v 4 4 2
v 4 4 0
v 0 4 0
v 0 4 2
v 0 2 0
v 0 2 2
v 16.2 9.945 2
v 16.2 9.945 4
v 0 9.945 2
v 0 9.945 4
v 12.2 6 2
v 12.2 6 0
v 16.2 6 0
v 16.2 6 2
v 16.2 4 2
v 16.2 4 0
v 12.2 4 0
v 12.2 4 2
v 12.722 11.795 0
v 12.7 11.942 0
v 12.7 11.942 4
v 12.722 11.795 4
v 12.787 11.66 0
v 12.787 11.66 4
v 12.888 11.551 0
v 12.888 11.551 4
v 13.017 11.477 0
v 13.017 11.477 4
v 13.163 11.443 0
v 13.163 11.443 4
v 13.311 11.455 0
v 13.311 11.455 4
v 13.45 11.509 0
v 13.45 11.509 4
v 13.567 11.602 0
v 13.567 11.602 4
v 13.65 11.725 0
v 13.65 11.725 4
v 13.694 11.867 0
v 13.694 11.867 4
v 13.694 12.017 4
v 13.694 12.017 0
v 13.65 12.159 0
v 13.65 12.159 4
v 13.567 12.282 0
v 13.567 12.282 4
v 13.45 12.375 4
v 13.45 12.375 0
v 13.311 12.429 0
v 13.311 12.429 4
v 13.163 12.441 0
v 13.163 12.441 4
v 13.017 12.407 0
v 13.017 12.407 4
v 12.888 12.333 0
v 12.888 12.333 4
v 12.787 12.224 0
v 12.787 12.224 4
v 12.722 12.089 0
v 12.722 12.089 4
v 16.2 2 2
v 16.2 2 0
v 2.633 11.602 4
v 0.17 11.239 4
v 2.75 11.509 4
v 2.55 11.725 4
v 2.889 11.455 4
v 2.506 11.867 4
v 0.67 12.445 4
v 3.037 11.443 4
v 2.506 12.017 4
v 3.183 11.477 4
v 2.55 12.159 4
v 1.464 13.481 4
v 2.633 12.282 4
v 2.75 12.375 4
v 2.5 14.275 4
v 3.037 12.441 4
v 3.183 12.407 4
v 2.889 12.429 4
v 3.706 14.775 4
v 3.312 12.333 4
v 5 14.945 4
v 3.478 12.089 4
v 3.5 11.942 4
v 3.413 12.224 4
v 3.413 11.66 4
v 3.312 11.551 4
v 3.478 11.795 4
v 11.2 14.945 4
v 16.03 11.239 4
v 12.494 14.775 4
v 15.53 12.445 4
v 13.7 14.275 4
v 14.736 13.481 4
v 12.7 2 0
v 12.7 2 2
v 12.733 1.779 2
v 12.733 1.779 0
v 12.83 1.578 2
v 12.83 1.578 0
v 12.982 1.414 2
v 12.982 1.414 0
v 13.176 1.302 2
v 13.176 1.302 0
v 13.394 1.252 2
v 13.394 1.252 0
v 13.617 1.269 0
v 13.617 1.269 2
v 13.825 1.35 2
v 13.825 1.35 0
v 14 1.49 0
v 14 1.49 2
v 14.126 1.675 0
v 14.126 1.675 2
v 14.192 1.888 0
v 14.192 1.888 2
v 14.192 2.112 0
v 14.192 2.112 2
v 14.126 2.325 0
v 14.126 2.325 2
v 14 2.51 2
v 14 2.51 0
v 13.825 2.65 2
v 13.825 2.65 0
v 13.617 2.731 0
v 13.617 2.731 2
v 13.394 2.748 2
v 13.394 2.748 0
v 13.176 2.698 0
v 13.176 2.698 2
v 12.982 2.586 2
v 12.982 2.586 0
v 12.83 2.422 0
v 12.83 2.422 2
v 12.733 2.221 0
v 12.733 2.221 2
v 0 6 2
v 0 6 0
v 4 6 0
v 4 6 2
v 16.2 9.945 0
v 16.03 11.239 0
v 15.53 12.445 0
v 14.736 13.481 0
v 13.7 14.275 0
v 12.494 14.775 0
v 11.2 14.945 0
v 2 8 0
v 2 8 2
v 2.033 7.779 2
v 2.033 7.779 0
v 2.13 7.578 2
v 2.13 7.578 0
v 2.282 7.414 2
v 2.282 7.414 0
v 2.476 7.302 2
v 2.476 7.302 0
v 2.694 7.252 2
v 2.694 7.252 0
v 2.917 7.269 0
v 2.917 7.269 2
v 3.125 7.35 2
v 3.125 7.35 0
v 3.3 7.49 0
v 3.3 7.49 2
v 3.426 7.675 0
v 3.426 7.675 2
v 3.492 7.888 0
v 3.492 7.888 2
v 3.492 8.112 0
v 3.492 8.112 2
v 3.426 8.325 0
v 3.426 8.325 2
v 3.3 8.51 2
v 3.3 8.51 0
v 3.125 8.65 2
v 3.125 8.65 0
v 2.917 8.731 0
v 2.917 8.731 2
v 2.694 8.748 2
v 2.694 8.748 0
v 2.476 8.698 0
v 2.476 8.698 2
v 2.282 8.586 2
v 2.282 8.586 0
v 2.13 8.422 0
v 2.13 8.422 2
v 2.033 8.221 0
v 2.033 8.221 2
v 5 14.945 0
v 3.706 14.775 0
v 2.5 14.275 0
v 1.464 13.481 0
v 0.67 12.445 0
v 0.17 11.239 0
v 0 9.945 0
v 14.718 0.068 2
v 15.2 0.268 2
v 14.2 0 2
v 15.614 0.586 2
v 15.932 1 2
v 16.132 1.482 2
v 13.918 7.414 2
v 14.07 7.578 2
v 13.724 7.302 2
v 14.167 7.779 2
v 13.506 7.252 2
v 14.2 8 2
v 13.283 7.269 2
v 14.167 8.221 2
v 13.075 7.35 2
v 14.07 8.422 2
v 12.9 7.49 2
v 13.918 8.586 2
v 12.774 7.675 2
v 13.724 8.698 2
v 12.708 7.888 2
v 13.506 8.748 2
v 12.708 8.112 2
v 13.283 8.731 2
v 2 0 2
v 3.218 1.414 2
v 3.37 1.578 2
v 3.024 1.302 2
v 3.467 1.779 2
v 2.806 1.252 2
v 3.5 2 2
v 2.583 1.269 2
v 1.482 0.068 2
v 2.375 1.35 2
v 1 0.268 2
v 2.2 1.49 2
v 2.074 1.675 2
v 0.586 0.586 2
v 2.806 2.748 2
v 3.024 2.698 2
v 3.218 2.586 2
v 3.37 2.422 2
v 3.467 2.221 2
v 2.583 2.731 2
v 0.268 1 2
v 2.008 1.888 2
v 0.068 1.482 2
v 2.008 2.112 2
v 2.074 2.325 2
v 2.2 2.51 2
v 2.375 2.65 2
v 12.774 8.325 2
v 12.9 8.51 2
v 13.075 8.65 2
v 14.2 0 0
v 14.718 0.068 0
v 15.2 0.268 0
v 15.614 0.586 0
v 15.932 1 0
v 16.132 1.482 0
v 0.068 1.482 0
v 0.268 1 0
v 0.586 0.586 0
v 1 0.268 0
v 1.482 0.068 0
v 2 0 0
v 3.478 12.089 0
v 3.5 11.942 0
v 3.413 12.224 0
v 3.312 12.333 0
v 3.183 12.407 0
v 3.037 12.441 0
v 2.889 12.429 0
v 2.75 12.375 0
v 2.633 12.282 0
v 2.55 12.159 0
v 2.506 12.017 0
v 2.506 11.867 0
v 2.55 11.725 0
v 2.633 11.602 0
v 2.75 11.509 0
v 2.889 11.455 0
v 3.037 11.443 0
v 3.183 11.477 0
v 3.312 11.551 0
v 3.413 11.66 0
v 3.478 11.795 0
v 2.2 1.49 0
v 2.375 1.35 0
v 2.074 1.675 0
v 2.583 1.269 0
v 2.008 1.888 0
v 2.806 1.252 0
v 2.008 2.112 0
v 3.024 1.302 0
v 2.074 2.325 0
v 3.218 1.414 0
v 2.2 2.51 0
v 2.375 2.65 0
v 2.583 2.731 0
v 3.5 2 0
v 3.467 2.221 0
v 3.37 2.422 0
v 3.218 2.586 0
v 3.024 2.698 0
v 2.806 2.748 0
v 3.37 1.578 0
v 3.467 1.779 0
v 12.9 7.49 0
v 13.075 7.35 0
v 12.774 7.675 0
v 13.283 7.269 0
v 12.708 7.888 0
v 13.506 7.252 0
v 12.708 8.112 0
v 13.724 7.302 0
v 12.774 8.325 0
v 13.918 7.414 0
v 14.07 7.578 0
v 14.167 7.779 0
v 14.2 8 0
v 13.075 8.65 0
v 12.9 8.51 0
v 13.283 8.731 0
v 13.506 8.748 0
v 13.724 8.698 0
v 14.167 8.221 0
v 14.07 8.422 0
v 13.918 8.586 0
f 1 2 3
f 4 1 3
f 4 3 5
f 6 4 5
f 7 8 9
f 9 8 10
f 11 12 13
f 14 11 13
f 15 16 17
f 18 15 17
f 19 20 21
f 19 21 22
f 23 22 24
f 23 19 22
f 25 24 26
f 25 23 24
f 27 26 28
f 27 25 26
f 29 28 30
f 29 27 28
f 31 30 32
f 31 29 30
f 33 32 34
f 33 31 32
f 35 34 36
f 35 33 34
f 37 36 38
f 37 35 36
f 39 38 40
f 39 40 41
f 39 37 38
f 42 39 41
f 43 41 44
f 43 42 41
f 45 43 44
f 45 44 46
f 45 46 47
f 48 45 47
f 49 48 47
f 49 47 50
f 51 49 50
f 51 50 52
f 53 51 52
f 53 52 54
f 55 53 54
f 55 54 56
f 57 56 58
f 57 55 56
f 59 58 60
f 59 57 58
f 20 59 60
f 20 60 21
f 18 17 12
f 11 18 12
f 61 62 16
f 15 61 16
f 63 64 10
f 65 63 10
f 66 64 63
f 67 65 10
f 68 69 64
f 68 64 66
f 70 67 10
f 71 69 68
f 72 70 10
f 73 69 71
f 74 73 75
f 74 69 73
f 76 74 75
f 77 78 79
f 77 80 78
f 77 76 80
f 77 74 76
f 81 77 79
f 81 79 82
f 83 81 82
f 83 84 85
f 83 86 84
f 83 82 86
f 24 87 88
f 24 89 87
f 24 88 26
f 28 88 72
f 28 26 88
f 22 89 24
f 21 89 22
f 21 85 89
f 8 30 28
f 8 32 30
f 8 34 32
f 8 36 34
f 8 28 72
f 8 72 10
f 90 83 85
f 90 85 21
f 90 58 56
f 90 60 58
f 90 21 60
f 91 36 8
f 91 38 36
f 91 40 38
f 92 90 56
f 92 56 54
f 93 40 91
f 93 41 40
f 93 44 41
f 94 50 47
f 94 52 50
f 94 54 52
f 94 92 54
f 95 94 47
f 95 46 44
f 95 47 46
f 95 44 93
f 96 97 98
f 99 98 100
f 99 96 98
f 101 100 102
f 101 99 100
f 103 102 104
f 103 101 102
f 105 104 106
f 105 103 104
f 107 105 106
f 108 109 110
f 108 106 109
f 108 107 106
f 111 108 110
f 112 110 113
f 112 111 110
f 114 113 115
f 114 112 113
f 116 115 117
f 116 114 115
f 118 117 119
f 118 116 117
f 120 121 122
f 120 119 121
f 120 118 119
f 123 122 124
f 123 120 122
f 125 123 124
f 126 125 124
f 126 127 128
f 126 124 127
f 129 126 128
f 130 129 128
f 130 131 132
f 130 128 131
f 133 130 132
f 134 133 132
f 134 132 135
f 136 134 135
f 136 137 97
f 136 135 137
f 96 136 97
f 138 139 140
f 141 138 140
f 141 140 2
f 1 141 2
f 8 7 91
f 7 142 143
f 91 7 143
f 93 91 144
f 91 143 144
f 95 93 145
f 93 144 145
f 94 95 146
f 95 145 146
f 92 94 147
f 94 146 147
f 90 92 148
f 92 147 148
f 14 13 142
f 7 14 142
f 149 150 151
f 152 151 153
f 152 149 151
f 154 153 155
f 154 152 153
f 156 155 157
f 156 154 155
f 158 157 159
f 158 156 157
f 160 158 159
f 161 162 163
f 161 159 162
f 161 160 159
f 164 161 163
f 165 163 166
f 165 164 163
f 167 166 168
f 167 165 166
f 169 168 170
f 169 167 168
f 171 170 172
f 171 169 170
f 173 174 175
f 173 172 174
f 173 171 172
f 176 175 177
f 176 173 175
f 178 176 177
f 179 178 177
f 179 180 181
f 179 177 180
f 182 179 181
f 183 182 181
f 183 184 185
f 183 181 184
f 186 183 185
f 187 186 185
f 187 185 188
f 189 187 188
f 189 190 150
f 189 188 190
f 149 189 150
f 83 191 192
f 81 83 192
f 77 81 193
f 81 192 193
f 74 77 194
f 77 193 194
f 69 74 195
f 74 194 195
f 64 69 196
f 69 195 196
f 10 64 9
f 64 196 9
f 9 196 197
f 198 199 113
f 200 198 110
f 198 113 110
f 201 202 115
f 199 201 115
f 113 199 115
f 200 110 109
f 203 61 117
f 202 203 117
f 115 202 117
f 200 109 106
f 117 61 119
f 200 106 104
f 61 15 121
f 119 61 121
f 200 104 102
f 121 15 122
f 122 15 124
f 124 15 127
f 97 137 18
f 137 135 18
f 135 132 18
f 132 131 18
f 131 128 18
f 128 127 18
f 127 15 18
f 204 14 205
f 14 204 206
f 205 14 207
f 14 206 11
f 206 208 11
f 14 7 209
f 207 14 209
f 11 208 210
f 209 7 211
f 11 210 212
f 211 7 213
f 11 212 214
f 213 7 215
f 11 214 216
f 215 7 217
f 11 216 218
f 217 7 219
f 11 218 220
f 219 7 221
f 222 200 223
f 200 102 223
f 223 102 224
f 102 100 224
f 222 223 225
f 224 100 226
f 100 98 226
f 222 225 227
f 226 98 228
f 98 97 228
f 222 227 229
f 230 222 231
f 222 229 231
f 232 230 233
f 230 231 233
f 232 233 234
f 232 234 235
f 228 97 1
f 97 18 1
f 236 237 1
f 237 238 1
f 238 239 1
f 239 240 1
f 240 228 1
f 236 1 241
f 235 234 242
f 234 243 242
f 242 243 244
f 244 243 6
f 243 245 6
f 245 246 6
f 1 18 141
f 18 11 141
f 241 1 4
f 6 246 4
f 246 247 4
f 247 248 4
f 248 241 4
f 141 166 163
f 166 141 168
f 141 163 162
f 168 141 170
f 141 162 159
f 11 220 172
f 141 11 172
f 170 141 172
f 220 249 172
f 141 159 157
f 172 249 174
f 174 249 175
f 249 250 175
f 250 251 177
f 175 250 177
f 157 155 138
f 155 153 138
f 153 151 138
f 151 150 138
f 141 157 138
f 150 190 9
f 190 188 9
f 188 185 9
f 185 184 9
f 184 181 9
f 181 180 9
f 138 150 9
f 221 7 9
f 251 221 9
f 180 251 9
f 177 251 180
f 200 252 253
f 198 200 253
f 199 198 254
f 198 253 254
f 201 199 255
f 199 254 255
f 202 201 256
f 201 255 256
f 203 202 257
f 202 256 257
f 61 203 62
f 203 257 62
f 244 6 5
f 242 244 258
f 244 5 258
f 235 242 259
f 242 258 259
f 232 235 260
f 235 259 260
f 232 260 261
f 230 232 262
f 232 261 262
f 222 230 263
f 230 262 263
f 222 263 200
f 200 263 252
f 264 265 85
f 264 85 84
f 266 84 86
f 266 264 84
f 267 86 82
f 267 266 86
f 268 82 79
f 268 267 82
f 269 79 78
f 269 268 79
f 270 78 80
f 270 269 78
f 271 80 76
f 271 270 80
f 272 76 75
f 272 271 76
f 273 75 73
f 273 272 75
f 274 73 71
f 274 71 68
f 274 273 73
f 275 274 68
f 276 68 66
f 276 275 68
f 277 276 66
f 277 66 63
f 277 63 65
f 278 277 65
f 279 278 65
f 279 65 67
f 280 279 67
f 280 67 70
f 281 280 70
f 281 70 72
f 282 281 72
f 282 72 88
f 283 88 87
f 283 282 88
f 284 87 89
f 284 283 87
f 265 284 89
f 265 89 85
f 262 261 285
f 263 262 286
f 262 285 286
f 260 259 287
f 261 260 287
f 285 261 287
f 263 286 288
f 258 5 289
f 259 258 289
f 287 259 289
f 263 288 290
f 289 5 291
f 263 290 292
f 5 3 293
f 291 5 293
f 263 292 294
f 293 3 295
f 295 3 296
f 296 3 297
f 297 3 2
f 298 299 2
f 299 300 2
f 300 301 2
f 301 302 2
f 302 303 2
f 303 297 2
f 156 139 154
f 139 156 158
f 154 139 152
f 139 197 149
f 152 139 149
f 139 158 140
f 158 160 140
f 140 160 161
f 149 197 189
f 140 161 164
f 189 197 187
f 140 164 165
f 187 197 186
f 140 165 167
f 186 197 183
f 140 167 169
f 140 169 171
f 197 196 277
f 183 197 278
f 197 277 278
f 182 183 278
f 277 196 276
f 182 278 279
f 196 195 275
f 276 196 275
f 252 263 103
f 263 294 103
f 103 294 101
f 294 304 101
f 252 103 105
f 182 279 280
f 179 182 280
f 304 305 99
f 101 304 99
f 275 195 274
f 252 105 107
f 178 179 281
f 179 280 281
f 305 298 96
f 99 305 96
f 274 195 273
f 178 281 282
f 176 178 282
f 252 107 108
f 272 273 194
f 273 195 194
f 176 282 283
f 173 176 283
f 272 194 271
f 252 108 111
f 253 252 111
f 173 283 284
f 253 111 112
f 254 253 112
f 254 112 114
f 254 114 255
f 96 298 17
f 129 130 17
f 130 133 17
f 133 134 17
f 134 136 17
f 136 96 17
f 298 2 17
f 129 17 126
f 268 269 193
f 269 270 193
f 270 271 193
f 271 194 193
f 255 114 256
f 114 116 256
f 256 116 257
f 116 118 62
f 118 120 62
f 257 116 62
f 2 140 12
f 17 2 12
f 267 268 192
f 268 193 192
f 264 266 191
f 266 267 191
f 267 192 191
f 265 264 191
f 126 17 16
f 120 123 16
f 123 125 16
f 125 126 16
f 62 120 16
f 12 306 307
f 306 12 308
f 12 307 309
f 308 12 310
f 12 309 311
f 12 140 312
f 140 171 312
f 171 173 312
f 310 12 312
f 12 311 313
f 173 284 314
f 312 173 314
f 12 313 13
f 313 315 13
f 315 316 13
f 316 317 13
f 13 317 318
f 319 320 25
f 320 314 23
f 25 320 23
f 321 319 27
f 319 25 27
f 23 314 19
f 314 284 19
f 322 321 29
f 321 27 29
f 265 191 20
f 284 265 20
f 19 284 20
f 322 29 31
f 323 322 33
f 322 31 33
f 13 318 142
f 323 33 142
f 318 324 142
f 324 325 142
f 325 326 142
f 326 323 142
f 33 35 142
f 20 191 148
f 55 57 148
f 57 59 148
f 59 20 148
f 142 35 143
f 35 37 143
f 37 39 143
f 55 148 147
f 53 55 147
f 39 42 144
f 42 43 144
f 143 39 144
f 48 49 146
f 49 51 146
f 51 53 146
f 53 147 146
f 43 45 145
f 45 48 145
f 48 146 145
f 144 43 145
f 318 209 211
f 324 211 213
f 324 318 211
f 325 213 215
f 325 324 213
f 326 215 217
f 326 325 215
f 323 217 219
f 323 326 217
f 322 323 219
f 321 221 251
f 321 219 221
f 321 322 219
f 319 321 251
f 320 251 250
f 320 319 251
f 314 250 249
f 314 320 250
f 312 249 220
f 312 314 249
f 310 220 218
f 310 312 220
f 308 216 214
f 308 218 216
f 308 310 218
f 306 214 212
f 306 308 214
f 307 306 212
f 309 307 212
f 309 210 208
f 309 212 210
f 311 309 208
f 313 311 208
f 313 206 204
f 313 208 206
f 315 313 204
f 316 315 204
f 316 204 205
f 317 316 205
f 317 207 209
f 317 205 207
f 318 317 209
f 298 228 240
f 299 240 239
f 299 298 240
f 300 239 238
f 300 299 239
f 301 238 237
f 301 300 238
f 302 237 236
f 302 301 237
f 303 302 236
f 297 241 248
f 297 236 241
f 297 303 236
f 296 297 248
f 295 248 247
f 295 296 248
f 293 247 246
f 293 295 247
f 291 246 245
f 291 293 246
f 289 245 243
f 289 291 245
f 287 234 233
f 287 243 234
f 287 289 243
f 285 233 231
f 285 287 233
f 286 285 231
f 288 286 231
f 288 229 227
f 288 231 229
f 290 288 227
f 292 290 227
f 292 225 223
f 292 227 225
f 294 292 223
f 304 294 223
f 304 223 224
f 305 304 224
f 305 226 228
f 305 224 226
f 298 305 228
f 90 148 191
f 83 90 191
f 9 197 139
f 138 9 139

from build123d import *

# Parameters (mm, degrees)
SKETCH2_R           = 0.75
SKETCH2_R_2         = 0.5
BOSS_EXTRUDE1_DEPTH = 4
SKETCH3_W           = 16.2
SKETCH3_H           = 9.945
CUT_EXTRUDE2_DEPTH  = 2


with BuildPart() as part:
    # Sketch2 → Boss-Extrude1 (new body)
    with BuildSketch(Plane.XY):
        with BuildLine():
            Line((0, 9.945), (0, 6))
            Line((0, 6), (4, 6))
            Line((4, 6), (4, 4))
            Line((4, 4), (0, 4))
            Line((0, 4), (0, 2))
            ThreePointArc((0, 2), (0.585786438, 0.585786438), (2, 0))
            Line((2, 0), (14.2, 0))
            ThreePointArc((14.2, 0), (15.614213562, 0.585786438), (16.2, 2))
            Line((16.2, 2), (16.2, 4))
            Line((16.2, 4), (12.2, 4))
            Line((12.2, 4), (12.2, 6))
            Line((12.2, 6), (16.2, 6))
            Line((16.2, 6), (16.2, 9.945))
            ThreePointArc((16.2, 9.945), (14.735533906, 13.480533906), (11.2, 14.945))
            Line((11.2, 14.945), (5, 14.945))
            ThreePointArc((5, 14.945), (1.464466094, 13.480533906), (0, 9.945))
        make_face()
        with Locations((13.45, 8)):
            Circle(SKETCH2_R, mode=Mode.SUBTRACT)
        with Locations((13.45, 2)):
            Circle(SKETCH2_R, mode=Mode.SUBTRACT)
        with Locations((13.2, 11.942)):
            Circle(SKETCH2_R_2, mode=Mode.SUBTRACT)
        with Locations((3, 11.942)):
            Circle(SKETCH2_R_2, mode=Mode.SUBTRACT)
        with Locations((2.75, 2)):
            Circle(SKETCH2_R, mode=Mode.SUBTRACT)
        with Locations((2.75, 8)):
            Circle(SKETCH2_R, mode=Mode.SUBTRACT)
    extrude(amount=BOSS_EXTRUDE1_DEPTH)

    # Sketch3 → Cut-Extrude2 (cut)
    with BuildSketch(Plane(origin=(0, 0, 4), x_dir=(-1, 0, 0), z_dir=(0, 0, -1))):
        with Locations((-8.1, 4.9725)):
            Rectangle(SKETCH3_W, SKETCH3_H)
    extrude(amount=CUT_EXTRUDE2_DEPTH, mode=Mode.SUBTRACT)


solid = part.part
